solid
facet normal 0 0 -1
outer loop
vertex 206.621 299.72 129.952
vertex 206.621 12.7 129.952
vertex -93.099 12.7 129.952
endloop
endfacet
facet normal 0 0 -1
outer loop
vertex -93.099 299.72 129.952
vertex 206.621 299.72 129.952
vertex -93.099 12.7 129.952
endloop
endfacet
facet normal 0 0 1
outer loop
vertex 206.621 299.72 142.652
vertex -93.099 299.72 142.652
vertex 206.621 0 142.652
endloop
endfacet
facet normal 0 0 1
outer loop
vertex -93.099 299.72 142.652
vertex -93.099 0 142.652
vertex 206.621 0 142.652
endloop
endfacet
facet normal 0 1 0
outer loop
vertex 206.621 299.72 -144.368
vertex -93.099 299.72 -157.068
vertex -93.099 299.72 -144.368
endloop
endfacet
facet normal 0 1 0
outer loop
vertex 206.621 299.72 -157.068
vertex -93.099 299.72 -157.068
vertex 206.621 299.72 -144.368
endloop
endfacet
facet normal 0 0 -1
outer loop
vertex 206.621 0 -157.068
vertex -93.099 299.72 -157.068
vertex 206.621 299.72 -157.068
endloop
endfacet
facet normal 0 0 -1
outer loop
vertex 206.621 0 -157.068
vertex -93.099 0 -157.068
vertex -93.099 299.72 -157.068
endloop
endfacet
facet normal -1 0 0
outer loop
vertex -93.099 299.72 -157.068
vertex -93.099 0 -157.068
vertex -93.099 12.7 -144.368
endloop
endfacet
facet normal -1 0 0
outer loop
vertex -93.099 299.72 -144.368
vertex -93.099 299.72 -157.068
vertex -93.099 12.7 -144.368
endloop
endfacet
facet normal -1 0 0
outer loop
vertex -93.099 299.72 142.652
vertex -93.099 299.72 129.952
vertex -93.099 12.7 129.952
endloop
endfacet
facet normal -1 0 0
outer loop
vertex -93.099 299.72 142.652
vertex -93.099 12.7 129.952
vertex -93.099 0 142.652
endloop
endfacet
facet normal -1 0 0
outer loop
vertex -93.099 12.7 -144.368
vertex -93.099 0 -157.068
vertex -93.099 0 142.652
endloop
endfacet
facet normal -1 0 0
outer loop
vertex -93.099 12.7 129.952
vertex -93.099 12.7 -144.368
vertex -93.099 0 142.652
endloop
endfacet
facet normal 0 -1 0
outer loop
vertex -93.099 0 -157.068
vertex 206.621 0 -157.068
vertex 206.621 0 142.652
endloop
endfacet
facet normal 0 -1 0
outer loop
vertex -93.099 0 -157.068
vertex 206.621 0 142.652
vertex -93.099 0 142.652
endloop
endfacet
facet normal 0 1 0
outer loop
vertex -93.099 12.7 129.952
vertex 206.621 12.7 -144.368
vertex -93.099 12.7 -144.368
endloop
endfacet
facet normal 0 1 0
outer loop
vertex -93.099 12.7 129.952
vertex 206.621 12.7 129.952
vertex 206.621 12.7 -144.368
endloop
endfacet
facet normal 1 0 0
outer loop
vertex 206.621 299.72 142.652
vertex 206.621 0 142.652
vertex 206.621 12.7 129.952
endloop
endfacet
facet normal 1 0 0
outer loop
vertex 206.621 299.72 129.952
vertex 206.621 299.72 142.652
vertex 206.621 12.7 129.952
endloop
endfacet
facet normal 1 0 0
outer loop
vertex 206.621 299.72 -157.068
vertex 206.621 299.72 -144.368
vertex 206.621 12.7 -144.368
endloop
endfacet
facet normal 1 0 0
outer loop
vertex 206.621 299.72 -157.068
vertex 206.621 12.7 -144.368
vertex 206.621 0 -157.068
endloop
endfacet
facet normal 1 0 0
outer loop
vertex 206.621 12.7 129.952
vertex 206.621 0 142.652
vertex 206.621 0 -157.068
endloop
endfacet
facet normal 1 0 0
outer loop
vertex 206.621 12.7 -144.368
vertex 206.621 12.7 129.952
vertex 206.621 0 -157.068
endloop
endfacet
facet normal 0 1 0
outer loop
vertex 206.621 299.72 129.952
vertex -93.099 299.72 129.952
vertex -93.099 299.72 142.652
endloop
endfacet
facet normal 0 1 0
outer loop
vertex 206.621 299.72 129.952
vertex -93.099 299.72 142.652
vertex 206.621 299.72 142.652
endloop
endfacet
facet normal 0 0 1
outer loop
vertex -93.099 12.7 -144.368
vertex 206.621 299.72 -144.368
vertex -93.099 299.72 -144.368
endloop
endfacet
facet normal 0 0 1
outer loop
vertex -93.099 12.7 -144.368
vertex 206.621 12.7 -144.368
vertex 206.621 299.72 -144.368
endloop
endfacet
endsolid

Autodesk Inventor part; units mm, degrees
ref_plane "YZ Plane" through (0, 0, 0) normal (1, 0, 0) x (0, 1, 0)
ref_plane "XZ Plane" through (0, 0, 0) normal (0, 1, 0) x (-1, 0, 0)
ref_plane "XY Plane" through (0, 0, 0) normal (0, 0, 1) x (1, 0, 0)
sketch "Sketch1" plane through (0, 0, 0) normal (0, 1, 0) x (-1, 0, 0)
  line L0 (93.0994, 142.6523) -> (-206.6206, 142.6523)
  line L1 (-206.6206, 142.6523) -> (-206.6206, -157.0677)
  line L2 (-206.6206, -157.0677) -> (93.0994, -157.0677)
  line L3 (93.0994, -157.0677) -> (93.0994, 142.6523)
  point P0 (0, 0)
  dimension "d0" = 299.72
  dimension "d1" = 299.72
extrude "Extrusion1" add sketch "Sketch1" along normal blind 12.7
sketch "Sketch2" plane through (0, 12.7, 0) normal (0, 1, 0) x (1, 0, 0)
  line L0 (-93.0994, -142.6523) -> (206.6206, -142.6523) projected
  line L1 (206.6206, -142.6523) -> (206.6206, 157.0677) projected
  line L2 (-93.0994, -142.6523) -> (206.6206, -142.6523)
  line L3 (206.6206, -142.6523) -> (206.6206, -129.9523)
  line L4 (206.6206, -129.9523) -> (-93.0994, -129.9523)
  line L5 (-93.0994, -129.9523) -> (-93.0994, -142.6523)
  point P0 (0, 0)
  dimension "d4" = 12.7
extrude "Extrusion2" add sketch "Sketch2" along normal blind 287.02
sketch "Sketch3" plane through (0, 12.7, 0) normal (0, 1, 0) x (1, 0, 0)
  line L0 (-93.0994, 157.0677) -> (-93.0994, -129.9523) projected
  line L1 (206.6206, -129.9523) -> (206.6206, 157.0677) projected
  line L2 (-93.0994, 157.0677) -> (206.6206, 157.0677)
  line L3 (206.6206, 157.0677) -> (206.6206, 144.3677)
  line L4 (206.6206, 144.3677) -> (-93.0994, 144.3677)
  line L5 (-93.0994, 144.3677) -> (-93.0994, 157.0677)
  point P0 (0, 0)
  dimension "d7" = 12.7
extrude "Extrusion3" add sketch "Sketch3" along normal blind 287.02
properties part number "chassisFloor"
